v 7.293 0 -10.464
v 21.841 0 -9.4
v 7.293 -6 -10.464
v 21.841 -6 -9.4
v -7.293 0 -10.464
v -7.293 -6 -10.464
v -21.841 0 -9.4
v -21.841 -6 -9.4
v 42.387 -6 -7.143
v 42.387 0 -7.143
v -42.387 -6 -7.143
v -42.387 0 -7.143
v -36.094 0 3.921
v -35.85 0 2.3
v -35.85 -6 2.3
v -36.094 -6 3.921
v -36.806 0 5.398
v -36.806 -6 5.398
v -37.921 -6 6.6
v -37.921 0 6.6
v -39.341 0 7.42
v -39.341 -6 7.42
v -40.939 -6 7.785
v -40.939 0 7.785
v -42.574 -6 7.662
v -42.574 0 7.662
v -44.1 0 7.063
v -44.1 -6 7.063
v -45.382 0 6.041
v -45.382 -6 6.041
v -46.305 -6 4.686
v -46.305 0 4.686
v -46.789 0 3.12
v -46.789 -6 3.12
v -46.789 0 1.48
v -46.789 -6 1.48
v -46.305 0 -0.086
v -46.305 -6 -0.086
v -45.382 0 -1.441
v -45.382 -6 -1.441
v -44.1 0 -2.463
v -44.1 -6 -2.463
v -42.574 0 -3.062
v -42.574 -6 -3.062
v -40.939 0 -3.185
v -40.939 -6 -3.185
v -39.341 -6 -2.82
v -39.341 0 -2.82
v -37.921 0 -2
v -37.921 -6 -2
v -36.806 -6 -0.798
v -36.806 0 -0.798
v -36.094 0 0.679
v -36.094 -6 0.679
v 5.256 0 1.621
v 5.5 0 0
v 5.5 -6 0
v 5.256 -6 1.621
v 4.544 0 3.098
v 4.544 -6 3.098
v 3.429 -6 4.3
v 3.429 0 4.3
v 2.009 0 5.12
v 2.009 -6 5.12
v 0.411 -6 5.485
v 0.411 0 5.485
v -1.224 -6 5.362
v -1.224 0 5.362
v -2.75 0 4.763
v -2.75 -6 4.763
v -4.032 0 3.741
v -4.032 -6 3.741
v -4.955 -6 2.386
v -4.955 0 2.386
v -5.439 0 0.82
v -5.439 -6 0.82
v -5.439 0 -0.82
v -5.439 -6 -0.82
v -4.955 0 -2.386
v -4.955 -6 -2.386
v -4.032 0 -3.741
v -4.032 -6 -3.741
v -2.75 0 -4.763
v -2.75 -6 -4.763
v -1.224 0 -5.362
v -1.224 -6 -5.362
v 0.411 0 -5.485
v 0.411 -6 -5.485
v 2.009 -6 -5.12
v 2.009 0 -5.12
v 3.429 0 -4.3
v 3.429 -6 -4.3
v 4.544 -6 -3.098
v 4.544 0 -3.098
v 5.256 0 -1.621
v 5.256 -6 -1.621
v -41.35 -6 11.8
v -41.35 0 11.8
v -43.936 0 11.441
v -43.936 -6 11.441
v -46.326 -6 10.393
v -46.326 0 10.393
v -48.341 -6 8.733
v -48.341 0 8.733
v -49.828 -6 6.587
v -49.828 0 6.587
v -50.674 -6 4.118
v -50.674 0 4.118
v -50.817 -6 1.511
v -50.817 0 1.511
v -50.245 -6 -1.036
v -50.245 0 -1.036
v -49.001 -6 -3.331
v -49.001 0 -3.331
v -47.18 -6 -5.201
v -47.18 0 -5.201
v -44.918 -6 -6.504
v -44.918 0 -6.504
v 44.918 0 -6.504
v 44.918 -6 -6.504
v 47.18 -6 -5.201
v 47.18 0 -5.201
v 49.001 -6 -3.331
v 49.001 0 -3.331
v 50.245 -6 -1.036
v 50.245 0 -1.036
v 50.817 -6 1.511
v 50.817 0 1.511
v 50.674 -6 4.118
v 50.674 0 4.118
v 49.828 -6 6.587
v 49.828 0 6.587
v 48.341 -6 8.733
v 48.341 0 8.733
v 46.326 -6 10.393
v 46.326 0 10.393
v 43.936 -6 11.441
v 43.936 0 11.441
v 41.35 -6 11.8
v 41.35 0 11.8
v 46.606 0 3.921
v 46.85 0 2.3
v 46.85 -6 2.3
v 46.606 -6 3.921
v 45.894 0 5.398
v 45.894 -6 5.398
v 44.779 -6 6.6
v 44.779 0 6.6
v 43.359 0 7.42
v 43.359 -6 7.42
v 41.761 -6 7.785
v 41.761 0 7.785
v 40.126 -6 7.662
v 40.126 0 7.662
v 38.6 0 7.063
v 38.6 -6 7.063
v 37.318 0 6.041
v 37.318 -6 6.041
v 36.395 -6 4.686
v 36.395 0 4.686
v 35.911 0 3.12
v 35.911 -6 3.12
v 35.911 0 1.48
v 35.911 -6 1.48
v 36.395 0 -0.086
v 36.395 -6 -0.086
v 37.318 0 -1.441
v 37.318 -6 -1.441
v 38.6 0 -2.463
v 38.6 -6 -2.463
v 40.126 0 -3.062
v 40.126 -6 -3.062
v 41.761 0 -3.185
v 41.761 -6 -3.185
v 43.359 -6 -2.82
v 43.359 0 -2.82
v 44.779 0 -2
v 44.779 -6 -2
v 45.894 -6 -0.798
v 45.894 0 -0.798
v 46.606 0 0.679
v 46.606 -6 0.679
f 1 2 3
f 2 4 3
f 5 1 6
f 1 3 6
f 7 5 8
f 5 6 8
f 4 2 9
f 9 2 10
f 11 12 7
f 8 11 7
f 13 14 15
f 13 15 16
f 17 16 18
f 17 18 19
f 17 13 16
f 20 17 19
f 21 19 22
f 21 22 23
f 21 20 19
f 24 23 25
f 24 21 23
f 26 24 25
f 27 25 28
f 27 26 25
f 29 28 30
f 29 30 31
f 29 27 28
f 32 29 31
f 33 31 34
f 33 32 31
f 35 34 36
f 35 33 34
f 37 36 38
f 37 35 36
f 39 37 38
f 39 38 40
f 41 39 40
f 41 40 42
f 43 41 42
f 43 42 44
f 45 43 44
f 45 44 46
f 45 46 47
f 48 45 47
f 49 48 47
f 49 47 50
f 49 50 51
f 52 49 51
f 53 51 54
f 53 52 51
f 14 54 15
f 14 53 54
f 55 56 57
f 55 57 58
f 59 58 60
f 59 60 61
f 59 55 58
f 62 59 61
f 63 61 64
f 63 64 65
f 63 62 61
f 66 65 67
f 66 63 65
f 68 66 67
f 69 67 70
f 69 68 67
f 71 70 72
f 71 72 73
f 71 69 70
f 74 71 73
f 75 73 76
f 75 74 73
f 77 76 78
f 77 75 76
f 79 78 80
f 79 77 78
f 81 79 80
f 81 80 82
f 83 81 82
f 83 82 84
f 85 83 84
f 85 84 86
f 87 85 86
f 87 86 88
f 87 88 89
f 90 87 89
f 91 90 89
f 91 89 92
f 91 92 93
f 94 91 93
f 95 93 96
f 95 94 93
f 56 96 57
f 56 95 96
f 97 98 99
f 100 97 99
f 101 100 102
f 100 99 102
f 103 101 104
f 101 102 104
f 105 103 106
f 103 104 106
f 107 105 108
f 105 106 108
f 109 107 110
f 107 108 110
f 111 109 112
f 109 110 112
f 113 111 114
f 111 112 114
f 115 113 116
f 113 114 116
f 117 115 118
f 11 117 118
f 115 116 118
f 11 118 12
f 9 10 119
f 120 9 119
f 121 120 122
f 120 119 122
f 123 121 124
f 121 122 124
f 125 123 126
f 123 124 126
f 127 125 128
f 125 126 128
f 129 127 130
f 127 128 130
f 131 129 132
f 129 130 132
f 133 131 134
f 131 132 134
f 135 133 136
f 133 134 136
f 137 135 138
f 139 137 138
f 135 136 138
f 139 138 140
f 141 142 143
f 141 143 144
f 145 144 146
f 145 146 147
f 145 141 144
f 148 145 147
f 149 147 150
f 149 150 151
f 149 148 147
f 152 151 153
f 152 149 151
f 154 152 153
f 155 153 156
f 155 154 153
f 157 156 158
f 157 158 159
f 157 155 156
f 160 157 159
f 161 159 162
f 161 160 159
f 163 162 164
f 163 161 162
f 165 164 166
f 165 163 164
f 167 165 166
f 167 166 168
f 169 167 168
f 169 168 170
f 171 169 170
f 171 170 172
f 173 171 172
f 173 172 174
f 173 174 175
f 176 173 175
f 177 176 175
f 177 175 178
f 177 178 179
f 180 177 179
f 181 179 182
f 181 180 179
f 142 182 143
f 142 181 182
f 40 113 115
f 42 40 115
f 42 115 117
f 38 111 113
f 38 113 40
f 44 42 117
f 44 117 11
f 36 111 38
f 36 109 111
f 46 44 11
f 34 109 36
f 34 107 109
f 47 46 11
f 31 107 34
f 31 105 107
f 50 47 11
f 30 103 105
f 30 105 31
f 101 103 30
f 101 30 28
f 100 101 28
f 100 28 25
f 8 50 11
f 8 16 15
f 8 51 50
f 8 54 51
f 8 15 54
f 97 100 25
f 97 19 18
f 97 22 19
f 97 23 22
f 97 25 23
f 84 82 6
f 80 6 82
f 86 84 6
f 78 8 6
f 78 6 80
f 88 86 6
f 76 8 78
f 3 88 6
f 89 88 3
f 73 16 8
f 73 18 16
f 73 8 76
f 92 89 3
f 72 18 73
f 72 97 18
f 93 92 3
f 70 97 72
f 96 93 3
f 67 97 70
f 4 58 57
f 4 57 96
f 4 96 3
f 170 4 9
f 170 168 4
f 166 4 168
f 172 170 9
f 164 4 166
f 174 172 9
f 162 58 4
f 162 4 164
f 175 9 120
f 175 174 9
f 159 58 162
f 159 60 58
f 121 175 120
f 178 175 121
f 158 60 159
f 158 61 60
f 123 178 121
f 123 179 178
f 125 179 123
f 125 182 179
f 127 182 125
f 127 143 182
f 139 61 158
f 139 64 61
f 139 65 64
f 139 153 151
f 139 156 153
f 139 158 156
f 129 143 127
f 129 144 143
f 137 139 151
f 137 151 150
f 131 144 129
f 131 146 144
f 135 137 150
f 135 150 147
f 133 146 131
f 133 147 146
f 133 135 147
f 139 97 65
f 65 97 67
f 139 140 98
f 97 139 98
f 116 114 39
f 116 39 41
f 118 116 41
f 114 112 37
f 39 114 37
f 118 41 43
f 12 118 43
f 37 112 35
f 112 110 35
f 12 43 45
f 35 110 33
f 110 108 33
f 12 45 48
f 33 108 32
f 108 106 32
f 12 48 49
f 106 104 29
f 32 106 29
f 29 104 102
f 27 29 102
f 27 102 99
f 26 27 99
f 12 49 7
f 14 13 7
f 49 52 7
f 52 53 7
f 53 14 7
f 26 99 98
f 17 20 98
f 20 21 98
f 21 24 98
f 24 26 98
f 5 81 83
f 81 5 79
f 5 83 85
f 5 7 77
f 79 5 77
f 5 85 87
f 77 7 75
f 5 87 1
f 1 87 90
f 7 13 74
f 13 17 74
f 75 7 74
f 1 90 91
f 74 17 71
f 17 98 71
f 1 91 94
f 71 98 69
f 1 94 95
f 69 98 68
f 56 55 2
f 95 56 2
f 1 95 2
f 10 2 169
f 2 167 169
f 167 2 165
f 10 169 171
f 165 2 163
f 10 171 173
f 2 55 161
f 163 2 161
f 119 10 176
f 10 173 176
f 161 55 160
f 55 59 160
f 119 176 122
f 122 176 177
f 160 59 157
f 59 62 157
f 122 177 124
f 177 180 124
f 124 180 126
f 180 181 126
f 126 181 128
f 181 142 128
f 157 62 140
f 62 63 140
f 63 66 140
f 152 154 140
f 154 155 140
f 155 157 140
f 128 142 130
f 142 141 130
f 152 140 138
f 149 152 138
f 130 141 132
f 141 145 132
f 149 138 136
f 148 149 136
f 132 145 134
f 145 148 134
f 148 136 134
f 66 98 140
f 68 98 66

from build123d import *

# Parameters (mm, degrees)
F0_R     = 5.5
F1_DEPTH = 6
F2_R     = 200


with BuildPart() as f1:
    # F0 (on Front) → F1 (new body)
    with BuildSketch(Plane.XZ):
        with BuildLine():
            Line((41.35, 11.8), (-41.35, 11.8))
            ThreePointArc((-41.35, 11.8), (-50.835785, 2.819506), (-42.387457, -7.143182))
            Line((-42.387457, -7.143182), (0, -11.8))
            Line((0, -11.8), (42.387457, -7.143182))
            ThreePointArc((42.387457, -7.143182), (50.835785, 2.819506), (41.35, 11.8))
        make_face()
        Circle(F0_R, mode=Mode.SUBTRACT)
        with Locations((-41.35, 2.3)):
            Circle(F0_R, mode=Mode.SUBTRACT)
        with Locations((41.35, 2.3)):
            Circle(F0_R, mode=Mode.SUBTRACT)
    extrude(amount=F1_DEPTH)

    # F2
    f2_edges = [f1.edges().sort_by_distance(p)[0] for p in [
        (0, -3, -11.8),
    ]]
    fillet(f2_edges, radius=F2_R)


solid = f1.part
